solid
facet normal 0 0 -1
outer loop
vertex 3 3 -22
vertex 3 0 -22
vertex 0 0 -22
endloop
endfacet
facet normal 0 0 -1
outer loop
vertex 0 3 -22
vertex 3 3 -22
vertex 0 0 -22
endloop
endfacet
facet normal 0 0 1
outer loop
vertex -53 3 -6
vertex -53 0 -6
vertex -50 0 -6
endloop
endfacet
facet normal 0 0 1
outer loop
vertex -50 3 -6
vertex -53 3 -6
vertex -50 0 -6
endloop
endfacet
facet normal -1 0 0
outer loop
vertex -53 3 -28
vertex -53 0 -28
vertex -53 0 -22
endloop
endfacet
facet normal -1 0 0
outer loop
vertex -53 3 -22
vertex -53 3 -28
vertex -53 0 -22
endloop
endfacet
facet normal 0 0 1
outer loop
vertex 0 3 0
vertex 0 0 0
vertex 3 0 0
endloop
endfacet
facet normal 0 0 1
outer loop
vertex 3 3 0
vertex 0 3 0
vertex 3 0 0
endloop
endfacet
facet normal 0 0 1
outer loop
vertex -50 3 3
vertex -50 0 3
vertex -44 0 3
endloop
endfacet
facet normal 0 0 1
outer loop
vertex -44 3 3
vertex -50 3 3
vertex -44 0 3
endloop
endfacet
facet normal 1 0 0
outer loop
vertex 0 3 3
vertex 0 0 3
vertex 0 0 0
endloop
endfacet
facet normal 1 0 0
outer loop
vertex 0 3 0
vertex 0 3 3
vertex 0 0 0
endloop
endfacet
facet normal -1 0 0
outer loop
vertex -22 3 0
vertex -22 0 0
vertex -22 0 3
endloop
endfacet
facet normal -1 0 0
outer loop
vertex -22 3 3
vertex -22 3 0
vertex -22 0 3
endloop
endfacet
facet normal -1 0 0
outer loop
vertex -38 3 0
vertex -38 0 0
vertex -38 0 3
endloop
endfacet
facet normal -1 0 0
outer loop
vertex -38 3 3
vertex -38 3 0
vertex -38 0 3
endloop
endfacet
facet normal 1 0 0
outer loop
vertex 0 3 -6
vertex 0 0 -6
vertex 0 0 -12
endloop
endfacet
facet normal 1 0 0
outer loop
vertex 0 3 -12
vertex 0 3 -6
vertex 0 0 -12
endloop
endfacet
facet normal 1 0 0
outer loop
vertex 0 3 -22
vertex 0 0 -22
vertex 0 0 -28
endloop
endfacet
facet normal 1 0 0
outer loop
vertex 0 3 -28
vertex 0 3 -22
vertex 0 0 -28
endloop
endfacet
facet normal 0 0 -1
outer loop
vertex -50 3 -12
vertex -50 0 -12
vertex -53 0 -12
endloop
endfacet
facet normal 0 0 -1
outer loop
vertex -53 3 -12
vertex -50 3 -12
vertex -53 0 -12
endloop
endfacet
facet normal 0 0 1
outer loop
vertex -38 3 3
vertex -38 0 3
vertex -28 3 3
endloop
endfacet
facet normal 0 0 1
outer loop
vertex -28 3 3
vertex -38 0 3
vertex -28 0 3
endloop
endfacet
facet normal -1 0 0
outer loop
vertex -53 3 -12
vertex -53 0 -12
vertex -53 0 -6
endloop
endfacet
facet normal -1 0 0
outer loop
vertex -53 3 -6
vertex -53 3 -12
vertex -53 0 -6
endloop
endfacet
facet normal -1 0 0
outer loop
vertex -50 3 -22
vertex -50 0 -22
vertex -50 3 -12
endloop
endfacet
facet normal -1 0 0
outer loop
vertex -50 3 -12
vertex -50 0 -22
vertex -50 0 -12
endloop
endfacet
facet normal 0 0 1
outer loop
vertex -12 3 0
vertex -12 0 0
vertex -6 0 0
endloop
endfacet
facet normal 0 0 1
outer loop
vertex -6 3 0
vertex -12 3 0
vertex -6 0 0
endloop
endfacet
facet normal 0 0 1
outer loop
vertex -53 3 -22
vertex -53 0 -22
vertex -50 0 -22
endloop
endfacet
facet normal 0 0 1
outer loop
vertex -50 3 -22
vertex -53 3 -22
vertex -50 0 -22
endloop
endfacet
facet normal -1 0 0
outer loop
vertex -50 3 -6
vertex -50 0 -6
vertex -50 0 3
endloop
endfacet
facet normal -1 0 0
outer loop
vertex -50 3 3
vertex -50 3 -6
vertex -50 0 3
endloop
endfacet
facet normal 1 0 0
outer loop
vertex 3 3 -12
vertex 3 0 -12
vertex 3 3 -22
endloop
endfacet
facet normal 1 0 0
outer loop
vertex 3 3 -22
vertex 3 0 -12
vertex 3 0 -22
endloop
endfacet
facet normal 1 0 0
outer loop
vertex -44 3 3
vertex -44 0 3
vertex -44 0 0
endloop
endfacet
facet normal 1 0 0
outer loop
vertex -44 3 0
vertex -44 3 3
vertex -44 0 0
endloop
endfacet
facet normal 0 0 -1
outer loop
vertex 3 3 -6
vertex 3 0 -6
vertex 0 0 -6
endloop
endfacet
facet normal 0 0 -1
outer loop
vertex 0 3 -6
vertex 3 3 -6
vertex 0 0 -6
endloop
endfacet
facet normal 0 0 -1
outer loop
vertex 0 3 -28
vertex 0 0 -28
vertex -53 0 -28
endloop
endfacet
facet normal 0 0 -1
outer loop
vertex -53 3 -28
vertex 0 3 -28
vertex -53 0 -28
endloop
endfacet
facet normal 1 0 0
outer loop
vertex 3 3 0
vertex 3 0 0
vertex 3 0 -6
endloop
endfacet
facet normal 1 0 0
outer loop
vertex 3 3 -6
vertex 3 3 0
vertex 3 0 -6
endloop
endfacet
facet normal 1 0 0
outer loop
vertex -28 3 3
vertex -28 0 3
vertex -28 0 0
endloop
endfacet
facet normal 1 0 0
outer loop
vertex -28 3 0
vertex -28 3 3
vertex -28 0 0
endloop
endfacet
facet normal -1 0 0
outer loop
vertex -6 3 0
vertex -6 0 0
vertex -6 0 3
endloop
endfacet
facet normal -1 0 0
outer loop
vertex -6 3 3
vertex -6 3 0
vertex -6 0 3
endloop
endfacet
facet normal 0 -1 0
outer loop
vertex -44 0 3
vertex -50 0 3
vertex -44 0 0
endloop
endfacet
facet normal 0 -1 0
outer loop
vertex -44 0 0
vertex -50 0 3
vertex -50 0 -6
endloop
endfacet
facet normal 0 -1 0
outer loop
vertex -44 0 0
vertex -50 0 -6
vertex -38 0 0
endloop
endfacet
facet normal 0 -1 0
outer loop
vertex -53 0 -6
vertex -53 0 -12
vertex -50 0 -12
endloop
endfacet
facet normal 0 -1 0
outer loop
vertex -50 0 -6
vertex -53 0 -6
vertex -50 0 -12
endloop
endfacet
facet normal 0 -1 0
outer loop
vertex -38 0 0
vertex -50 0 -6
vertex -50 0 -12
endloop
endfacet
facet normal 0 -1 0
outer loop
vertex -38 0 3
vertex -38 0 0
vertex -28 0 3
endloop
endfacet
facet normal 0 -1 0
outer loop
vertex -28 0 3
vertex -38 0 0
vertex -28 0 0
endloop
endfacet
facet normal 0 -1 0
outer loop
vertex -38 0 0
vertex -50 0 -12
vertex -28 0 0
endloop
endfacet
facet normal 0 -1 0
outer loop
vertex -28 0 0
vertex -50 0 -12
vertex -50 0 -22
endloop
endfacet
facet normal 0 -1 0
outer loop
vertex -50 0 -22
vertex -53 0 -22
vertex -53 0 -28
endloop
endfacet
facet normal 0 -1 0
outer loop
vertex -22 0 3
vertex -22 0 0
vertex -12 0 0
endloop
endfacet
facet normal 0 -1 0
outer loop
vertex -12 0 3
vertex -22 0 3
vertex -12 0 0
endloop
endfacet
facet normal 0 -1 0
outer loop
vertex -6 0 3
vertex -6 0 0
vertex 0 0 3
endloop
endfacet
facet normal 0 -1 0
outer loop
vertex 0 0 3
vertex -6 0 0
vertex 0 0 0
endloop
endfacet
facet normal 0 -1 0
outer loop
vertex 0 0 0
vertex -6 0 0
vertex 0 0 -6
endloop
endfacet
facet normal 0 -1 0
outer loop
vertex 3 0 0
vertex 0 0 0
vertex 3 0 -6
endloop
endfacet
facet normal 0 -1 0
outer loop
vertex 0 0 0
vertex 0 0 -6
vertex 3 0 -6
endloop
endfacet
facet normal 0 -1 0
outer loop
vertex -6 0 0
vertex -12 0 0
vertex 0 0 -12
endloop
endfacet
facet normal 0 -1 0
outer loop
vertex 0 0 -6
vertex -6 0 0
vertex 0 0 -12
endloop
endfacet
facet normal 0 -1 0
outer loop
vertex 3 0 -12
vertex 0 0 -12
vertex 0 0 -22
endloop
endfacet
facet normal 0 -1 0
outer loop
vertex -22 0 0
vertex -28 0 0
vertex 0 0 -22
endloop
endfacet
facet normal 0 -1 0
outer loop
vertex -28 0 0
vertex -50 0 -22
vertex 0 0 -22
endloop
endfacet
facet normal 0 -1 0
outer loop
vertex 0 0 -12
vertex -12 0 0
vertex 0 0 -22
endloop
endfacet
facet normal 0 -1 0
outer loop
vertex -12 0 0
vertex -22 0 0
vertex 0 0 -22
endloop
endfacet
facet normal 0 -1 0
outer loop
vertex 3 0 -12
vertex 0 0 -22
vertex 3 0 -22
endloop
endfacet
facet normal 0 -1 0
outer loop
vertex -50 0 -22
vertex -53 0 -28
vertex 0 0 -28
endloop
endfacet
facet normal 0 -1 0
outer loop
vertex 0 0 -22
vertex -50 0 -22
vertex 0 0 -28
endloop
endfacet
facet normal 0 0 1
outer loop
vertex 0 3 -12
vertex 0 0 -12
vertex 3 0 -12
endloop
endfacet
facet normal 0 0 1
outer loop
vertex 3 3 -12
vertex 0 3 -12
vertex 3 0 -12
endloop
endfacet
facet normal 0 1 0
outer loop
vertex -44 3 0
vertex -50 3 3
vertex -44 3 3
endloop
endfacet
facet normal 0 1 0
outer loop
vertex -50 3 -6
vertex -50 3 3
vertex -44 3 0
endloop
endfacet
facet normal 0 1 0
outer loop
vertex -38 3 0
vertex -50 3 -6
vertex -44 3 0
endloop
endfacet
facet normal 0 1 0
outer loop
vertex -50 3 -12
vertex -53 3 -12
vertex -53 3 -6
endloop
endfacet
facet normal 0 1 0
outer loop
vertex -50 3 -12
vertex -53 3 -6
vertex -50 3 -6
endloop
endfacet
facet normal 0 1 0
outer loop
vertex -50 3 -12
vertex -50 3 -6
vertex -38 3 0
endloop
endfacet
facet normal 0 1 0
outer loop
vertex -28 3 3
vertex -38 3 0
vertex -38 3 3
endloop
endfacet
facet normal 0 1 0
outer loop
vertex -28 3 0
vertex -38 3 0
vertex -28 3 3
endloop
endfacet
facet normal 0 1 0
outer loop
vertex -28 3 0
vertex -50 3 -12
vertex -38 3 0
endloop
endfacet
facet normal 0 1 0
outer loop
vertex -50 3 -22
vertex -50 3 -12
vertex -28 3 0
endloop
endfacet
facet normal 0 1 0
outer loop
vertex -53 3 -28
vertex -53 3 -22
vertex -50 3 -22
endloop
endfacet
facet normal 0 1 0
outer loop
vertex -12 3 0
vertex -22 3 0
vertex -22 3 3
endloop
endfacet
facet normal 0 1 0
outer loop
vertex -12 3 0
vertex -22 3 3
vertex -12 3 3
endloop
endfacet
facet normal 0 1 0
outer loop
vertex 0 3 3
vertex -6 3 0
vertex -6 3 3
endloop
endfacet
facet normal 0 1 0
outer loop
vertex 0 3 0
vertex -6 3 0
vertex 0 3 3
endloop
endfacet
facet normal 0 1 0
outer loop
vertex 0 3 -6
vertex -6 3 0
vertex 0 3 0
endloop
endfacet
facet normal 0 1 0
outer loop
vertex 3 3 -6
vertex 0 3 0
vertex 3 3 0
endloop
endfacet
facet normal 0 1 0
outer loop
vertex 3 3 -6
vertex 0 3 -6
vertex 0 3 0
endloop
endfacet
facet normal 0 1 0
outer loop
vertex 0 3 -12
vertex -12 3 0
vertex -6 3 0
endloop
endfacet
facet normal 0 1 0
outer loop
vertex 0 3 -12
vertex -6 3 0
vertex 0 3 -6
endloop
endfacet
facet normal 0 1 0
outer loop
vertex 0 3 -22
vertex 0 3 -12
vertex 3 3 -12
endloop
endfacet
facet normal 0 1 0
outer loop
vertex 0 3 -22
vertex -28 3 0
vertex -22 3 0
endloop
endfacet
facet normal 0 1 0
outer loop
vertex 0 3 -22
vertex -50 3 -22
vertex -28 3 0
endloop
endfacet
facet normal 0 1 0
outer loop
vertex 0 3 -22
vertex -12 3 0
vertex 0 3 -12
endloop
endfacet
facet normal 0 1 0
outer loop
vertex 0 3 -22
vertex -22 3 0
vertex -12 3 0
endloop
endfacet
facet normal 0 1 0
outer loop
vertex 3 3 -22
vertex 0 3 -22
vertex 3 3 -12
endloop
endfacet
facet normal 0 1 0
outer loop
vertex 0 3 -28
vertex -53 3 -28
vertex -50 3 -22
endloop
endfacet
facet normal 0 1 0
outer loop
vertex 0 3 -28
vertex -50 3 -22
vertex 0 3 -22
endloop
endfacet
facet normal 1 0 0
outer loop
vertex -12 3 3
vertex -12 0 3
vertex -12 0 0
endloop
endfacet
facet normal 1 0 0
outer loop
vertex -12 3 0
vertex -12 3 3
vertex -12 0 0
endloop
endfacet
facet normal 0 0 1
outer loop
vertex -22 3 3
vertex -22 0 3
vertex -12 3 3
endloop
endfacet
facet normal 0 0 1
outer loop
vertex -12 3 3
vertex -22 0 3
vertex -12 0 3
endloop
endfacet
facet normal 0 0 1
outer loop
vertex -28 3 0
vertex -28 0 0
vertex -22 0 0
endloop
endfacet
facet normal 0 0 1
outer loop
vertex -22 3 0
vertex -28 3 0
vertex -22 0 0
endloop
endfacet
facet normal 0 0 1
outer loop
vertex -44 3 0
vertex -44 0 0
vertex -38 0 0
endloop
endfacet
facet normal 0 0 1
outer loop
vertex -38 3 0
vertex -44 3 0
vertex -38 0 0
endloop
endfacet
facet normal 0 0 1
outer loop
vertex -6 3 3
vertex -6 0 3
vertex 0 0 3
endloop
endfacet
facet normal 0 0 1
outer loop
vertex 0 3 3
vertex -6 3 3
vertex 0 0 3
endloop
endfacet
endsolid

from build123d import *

# Parameters (mm, degrees)
BOSS_EXTRUDE1_DEPTH = 3
SKETCH2_W           = 56
SKETCH2_H           = 25
CUT_EXTRUDE1_DEPTH  = 76.013332148


with BuildPart() as part:
    # Sketch1 → Boss-Extrude1 (new body)
    with BuildSketch(Plane(origin=(0, 0, 0), x_dir=(1, 0, 0), z_dir=(0, 1, 0))):
        Polygon((0, -3), (0, 0), (3, 0), (3, 6), (0, 6), (0, 12), (3, 12), (3, 22), (0, 22), (0, 28), (3, 28), (3, 38), (0, 38), (0, 44), (3, 44), (3, 50), (0, 50), (0, 53), (-6, 53), (-6, 50), (-12, 50), (-12, 53), (-22, 53), (-22, 50), (-28, 50), (-28, 53), (-38, 53), (-38, 50), (-44, 50), (-44, 53), (-50, 53), (-50, 44), (-53, 44), (-53, 38), (-50, 38), (-50, 28), (-53, 28), (-53, 22), (-50, 22), (-50, 12), (-53, 12), (-53, 6), (-50, 6), (-50, -3), (-44, -3), (-44, 0), (-38, 0), (-38, -3), (-28, -3), (-28, 0), (-22, 0), (-22, -3), (-12, -3), (-12, 0), (-6, 0), (-6, -3), align=None)
    extrude(amount=BOSS_EXTRUDE1_DEPTH)

    # Sketch2 → Cut-Extrude1 (cut, through all)
    with BuildSketch(Plane(origin=(0, 3, 0), x_dir=(1, 0, 0), z_dir=(0, 1, 0))):
        with Locations((-25, 40.5)):
            Rectangle(SKETCH2_W, SKETCH2_H)
    extrude(amount=-CUT_EXTRUDE1_DEPTH, mode=Mode.SUBTRACT)


solid = part.part
